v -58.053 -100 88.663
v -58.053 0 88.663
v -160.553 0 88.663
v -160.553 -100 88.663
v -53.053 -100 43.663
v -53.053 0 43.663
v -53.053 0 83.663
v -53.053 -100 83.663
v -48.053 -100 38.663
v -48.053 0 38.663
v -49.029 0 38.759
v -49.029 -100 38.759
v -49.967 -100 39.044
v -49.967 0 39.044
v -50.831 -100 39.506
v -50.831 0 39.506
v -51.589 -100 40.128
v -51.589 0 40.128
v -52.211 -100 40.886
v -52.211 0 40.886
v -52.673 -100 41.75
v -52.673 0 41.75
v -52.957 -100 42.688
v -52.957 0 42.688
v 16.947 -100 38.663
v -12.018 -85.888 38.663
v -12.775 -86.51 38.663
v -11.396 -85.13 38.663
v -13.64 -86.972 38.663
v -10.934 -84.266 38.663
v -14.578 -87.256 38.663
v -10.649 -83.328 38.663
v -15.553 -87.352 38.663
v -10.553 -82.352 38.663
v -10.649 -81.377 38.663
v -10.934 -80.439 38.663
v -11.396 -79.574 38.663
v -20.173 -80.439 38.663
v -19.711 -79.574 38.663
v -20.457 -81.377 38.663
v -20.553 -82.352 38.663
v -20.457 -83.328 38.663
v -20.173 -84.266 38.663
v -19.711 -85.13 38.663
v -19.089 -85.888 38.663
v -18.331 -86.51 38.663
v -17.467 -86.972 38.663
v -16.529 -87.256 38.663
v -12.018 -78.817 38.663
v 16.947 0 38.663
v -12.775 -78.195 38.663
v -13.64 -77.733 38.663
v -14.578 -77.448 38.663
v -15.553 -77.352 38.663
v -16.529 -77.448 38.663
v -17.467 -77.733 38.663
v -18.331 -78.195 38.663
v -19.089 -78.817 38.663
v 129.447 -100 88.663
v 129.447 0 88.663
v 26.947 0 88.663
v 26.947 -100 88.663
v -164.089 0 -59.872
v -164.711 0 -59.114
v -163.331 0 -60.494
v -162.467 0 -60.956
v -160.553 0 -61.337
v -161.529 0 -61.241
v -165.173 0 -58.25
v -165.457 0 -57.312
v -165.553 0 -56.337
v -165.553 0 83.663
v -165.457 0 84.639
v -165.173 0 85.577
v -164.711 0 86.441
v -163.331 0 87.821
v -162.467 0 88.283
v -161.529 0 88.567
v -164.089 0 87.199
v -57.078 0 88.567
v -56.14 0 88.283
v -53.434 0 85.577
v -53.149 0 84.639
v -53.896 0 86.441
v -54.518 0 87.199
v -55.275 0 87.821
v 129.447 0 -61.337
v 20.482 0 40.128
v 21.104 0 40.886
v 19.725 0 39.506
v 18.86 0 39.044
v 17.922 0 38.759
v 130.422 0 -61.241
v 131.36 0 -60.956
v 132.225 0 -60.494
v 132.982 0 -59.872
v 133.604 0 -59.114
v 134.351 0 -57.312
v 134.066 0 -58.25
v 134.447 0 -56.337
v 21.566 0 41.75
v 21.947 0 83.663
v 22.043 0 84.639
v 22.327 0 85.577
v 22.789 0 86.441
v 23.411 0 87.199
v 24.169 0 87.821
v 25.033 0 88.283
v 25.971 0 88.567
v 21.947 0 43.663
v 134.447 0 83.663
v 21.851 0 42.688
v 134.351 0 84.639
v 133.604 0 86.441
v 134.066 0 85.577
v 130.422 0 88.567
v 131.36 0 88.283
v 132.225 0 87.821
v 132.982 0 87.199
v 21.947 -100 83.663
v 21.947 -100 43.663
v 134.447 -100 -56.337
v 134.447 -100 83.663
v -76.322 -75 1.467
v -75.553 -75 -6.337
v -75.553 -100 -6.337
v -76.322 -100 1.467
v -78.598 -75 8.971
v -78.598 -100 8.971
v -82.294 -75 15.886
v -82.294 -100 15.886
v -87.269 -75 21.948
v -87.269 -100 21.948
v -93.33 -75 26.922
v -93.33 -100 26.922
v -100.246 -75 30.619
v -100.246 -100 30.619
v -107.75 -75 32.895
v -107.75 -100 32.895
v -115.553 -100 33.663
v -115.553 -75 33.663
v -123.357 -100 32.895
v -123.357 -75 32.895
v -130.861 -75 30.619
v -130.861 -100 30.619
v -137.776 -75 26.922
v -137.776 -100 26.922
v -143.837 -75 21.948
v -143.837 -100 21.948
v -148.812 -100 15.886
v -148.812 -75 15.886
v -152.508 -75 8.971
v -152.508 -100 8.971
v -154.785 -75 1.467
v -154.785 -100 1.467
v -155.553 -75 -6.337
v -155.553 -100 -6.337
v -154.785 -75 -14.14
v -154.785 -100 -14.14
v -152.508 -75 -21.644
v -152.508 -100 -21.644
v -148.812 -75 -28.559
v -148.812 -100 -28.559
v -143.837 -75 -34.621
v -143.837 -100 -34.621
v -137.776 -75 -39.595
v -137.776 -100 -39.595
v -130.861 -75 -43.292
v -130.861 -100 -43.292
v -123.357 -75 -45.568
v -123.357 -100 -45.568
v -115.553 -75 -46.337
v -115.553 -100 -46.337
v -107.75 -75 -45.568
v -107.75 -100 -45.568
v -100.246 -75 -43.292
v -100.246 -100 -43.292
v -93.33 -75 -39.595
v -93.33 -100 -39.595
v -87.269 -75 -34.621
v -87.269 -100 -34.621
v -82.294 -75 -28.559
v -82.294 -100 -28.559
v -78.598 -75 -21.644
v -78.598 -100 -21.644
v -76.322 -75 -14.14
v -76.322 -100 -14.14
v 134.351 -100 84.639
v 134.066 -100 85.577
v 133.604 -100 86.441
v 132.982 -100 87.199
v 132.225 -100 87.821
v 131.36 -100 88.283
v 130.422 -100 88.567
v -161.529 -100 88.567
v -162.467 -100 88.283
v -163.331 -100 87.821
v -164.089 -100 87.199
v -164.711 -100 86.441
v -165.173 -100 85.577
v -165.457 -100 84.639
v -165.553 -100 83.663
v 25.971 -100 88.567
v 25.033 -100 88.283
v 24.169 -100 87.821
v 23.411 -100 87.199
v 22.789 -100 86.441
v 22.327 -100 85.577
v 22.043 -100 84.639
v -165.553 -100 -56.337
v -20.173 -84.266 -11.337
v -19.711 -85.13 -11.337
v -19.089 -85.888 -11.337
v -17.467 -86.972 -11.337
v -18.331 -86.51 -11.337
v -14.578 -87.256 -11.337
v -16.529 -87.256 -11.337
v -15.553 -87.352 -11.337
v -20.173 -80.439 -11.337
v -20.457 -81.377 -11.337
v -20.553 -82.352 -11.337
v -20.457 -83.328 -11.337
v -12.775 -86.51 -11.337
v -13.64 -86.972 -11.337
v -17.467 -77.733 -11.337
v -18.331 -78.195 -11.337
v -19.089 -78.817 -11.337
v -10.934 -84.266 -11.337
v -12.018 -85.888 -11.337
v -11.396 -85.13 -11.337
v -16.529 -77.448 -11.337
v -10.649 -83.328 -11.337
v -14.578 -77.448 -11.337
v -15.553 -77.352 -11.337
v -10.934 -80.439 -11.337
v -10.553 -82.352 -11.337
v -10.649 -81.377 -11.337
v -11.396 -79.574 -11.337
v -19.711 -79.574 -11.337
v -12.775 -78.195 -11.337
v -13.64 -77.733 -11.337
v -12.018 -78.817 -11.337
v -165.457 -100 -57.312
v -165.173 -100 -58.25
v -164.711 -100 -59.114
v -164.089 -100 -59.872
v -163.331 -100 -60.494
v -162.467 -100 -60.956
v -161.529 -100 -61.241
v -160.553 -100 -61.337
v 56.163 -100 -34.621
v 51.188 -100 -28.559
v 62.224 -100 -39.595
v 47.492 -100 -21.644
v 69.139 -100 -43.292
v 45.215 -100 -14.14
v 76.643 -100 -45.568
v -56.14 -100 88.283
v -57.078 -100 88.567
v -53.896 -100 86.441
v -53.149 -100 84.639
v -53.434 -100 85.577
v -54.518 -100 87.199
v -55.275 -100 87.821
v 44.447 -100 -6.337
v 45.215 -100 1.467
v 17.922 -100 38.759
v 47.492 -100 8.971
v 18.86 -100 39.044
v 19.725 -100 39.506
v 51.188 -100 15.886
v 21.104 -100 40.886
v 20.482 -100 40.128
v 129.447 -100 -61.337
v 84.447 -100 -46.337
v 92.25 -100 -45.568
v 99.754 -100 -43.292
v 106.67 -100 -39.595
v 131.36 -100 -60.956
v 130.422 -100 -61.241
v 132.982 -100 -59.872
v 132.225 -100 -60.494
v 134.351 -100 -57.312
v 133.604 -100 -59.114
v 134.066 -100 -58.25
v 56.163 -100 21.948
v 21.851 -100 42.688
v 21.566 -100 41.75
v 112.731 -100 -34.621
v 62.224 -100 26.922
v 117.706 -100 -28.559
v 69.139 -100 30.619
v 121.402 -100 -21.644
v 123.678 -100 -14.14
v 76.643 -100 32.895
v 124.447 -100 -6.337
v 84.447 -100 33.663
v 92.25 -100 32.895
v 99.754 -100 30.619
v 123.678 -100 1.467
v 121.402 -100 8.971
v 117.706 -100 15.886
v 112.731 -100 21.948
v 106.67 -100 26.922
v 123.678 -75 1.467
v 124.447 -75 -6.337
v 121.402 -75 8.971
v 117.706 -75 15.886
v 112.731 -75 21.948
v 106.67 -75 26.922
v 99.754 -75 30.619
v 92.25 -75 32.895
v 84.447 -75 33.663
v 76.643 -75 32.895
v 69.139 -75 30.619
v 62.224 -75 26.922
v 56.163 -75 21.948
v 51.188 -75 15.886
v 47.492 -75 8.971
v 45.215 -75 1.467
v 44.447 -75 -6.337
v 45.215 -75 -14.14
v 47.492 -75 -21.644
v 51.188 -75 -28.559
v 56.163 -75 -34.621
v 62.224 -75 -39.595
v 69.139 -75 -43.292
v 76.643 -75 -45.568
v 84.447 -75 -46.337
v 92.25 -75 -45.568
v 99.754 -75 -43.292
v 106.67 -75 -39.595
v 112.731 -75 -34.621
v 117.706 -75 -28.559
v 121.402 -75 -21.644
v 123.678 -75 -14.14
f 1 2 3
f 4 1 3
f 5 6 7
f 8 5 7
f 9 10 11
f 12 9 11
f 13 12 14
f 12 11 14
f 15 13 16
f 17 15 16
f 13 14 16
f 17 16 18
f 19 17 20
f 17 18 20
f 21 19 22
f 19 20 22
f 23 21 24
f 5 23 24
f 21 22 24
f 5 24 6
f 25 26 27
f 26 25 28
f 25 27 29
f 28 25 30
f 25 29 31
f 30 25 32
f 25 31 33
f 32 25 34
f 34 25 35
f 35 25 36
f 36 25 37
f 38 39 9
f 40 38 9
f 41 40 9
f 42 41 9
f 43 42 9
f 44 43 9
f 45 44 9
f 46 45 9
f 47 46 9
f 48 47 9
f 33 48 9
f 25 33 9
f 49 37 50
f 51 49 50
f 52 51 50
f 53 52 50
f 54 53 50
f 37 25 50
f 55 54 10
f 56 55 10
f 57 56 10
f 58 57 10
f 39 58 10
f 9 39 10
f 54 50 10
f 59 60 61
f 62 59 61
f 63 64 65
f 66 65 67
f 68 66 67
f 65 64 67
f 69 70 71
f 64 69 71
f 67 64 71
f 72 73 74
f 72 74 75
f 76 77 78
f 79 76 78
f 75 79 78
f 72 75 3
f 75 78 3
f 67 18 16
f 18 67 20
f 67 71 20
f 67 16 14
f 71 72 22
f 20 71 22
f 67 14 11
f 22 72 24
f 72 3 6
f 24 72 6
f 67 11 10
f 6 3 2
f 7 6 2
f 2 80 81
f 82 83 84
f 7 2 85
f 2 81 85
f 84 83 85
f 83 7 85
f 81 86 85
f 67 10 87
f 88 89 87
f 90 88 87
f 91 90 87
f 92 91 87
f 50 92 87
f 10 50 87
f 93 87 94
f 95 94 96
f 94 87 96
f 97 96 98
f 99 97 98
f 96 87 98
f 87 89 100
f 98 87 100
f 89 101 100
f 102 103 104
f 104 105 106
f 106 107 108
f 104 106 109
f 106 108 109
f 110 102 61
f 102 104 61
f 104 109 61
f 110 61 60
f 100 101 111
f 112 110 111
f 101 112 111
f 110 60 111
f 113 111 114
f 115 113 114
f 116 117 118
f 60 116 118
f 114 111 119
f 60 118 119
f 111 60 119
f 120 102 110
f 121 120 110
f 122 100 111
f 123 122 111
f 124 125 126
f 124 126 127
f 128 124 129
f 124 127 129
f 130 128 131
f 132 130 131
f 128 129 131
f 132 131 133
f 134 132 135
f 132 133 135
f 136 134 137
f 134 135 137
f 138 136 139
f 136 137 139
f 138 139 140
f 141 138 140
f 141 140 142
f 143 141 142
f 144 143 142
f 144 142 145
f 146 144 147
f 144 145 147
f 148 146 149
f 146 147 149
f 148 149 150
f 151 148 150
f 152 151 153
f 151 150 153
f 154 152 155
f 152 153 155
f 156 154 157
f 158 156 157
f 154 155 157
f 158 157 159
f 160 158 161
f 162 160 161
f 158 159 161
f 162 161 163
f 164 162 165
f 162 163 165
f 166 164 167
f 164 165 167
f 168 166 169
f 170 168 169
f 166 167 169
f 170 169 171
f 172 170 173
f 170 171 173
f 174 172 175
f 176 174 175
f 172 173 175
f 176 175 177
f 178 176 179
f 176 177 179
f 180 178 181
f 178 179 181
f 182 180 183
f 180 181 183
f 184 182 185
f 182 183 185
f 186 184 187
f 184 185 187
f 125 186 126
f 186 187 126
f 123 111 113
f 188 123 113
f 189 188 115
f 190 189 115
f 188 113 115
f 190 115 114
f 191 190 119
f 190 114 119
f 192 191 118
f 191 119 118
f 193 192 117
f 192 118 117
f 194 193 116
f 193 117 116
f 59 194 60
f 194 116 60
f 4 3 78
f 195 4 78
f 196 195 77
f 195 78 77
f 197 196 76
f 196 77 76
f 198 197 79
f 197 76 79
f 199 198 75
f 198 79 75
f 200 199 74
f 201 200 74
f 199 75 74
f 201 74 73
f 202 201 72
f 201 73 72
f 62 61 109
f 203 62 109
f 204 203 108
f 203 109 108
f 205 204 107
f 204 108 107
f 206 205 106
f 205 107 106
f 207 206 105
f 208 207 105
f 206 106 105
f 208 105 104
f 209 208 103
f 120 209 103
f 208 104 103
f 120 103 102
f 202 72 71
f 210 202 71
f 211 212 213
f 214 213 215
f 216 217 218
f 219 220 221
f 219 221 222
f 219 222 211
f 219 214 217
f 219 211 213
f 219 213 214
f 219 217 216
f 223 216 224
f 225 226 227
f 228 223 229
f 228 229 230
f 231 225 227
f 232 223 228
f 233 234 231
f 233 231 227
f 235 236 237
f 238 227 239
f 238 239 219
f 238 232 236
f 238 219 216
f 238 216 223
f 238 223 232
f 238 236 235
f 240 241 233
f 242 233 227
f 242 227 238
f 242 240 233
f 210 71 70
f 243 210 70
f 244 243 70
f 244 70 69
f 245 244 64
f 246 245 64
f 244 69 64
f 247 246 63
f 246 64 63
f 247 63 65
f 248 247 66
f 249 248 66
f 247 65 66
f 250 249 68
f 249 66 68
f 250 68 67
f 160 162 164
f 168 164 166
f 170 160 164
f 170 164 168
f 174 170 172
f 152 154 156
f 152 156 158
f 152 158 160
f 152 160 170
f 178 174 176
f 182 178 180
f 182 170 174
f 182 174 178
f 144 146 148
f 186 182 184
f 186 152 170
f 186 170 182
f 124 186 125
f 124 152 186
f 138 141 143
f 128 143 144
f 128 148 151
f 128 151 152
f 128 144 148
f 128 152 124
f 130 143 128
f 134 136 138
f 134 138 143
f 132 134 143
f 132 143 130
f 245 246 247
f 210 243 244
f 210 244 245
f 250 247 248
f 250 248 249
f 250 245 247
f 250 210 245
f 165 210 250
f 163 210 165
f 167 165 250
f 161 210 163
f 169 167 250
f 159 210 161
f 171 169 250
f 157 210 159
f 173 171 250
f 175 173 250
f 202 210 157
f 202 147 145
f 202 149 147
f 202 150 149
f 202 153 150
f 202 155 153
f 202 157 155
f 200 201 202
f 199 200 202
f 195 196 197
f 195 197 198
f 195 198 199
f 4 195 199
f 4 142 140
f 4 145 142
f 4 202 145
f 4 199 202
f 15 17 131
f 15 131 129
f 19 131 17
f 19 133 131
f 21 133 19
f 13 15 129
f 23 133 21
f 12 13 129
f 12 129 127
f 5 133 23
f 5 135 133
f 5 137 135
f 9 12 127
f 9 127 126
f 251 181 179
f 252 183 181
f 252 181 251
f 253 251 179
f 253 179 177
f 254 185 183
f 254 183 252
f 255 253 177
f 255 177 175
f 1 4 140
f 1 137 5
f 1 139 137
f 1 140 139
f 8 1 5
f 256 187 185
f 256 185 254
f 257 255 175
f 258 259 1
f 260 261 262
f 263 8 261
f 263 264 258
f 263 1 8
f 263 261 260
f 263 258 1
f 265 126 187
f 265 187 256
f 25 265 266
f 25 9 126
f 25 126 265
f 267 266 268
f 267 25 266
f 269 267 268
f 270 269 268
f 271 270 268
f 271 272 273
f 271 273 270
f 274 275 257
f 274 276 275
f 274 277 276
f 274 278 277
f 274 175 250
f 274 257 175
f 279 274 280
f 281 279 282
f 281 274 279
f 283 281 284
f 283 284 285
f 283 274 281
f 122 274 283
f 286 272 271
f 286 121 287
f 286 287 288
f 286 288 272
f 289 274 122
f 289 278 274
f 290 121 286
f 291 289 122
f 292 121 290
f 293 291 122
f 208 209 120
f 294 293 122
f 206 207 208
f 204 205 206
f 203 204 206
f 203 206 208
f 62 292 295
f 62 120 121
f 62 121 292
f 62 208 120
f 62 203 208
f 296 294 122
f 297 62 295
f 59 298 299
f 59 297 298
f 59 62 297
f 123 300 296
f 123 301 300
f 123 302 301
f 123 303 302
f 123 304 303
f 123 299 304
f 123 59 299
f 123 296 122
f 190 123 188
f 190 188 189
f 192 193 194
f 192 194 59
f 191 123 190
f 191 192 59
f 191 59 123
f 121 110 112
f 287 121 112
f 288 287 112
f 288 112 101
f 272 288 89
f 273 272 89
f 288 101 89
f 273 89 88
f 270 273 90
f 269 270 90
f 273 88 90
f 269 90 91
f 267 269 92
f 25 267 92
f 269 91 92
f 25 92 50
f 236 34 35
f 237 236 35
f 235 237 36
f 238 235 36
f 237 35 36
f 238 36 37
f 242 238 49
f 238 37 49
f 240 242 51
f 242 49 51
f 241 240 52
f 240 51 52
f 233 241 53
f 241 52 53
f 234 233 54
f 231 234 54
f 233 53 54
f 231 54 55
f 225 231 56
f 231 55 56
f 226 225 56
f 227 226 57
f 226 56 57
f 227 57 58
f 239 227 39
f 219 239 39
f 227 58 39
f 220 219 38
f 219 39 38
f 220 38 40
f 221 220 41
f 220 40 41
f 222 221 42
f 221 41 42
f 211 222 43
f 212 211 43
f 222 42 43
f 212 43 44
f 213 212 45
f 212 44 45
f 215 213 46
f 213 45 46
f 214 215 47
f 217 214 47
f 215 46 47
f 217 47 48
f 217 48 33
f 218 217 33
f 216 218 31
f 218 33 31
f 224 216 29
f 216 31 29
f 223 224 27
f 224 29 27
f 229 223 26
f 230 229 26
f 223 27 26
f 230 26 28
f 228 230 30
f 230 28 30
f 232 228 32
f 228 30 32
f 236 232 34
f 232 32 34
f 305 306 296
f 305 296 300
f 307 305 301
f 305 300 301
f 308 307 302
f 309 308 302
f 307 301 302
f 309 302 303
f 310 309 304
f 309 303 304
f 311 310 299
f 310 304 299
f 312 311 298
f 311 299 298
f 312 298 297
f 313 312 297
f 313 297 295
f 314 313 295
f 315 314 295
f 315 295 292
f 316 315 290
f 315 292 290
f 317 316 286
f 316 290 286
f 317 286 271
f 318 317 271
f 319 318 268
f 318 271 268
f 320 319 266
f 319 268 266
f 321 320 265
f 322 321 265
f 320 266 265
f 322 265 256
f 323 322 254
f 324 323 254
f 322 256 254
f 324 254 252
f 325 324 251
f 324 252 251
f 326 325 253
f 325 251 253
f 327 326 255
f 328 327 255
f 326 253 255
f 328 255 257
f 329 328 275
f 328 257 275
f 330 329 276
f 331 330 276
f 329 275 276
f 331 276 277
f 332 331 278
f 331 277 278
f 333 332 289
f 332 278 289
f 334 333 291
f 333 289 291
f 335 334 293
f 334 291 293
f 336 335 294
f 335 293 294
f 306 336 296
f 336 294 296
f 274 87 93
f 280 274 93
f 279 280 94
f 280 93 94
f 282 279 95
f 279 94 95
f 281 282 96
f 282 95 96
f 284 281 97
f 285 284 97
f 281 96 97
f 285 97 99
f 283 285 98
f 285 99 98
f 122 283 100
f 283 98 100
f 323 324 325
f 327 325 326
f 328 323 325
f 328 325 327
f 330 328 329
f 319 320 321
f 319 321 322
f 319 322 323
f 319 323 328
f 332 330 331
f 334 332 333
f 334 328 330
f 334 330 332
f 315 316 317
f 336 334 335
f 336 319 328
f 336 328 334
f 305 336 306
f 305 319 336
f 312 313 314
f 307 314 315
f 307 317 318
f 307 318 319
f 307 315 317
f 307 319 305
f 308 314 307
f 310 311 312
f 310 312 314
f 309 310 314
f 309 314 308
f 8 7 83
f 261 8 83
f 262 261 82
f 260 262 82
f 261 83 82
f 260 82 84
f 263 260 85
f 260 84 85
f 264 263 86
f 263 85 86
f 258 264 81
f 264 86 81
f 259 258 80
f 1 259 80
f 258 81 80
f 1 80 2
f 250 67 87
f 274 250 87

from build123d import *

# Parameters (mm, degrees)
F1_DEPTH = 100
F2_R     = 40
F3_DEPTH = 25
F4_R     = 5
F5_DEPTH = 50


with BuildPart() as f1:
    # F0 (on Front) → F1 (new body)
    with BuildSketch(Plane.XZ):
        with BuildLine():
            Line((-58.053203, 88.663405), (-160.553203, 88.663405))
            ThreePointArc((-160.553203, 88.663405), (-164.088737, 87.198939), (-165.553203, 83.663405))
            Line((-165.553203, 83.663405), (-165.553203, -56.336595))
            ThreePointArc((-165.553203, -56.336595), (-164.088737, -59.872129), (-160.553203, -61.336595))
            Line((-160.553203, -61.336595), (129.446797, -61.336595))
            ThreePointArc((129.446797, -61.336595), (132.98233, -59.872129), (134.446797, -56.336595))
            Line((134.446797, -56.336595), (134.446797, 83.663405))
            ThreePointArc((134.446797, 83.663405), (132.98233, 87.198939), (129.446797, 88.663405))
            Line((129.446797, 88.663405), (26.946797, 88.663405))
            ThreePointArc((26.946797, 88.663405), (23.411263, 87.198939), (21.946797, 83.663405))
            Line((21.946797, 83.663405), (21.946797, 43.663405))
            ThreePointArc((21.946797, 43.663405), (20.48233, 40.127871), (16.946797, 38.663405))
            Line((16.946797, 38.663405), (-48.053203, 38.663405))
            ThreePointArc((-48.053203, 38.663405), (-51.588737, 40.127871), (-53.053203, 43.663405))
            Line((-53.053203, 43.663405), (-53.053203, 83.663405))
            ThreePointArc((-53.053203, 83.663405), (-54.51767, 87.198939), (-58.053203, 88.663405))
        make_face()
    extrude(amount=F1_DEPTH)

    # F2 (on face) → F3 (cut)
    with BuildSketch(Plane.XZ.offset(100)):
        with Locations((-115.553203, -6.336595)):
            Circle(F2_R)
        with Locations((84.446797, -6.336595)):
            Circle(F2_R)
    extrude(amount=-F3_DEPTH, mode=Mode.SUBTRACT)

    # F4 (on face) → F5 (cut)
    with BuildSketch(Plane.XY.offset(38.663405)):
        with Locations((-15.553203, -82.352199)):
            Circle(F4_R)
    extrude(amount=-F5_DEPTH, mode=Mode.SUBTRACT)


solid = f1.part
